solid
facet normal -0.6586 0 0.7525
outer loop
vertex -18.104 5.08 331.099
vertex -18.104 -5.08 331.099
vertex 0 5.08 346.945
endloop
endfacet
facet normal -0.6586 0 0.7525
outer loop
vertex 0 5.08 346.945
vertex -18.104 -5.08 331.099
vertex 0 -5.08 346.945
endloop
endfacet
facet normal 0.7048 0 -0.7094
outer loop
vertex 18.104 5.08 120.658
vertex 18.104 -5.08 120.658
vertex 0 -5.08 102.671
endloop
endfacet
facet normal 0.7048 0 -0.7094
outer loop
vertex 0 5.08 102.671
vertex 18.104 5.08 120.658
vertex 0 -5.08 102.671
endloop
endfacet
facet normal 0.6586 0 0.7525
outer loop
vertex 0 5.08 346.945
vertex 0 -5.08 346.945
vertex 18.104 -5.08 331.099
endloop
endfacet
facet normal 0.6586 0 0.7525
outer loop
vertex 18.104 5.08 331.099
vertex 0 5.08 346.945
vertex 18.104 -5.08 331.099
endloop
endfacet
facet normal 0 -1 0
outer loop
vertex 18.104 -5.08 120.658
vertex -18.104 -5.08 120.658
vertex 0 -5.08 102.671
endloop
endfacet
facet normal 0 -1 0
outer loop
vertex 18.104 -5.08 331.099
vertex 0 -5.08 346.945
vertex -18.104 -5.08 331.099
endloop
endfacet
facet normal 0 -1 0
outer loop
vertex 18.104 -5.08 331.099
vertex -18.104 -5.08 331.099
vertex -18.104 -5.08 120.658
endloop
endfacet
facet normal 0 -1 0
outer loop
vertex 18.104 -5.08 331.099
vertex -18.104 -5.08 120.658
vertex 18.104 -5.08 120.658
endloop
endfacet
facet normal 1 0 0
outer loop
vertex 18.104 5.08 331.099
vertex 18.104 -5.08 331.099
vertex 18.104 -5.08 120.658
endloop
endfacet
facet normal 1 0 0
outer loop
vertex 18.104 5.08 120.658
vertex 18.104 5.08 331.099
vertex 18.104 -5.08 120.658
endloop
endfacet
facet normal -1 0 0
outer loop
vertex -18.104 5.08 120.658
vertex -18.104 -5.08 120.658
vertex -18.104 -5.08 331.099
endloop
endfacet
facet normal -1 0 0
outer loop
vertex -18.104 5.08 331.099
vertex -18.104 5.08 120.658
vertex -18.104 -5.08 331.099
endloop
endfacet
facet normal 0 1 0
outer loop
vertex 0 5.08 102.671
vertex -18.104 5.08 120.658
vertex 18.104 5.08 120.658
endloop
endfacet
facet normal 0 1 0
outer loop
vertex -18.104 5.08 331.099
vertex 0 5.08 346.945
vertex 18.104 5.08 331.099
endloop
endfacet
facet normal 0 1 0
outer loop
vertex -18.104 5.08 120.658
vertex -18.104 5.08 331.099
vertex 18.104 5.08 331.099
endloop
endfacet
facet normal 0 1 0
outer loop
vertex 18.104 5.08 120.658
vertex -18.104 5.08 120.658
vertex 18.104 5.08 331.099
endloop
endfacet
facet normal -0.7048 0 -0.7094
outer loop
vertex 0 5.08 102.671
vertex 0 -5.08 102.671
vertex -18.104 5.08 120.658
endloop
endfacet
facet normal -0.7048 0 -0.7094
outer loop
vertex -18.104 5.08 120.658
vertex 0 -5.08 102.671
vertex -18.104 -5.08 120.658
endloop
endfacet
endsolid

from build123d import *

# Parameters (mm, degrees)
F1_DEPTH = 5.08
F2_SIZE2 = 2.54
F2_SIZE  = 2.54
F3_W     = 296.9444543123
F3_H     = 473.9504568279
F4_DEPTH = 25.4
F5_DEPTH = 25.4


with BuildPart() as f1:
    # F0 (on Front) → F1 (new body, symmetric)
    with BuildSketch(Plane.XZ):
        with BuildLine():
            Line((-52.1713197231, 34.4429798424), (-58.770544827, 10.8928056434))
            add(Edge.make_bspline(
                [(-58.770544827, 10.8928056434), (-56.5008980701, 12.7169401311), (-52.1836149963, 16.1867774191), (-46.6481737875, 20.7689821181), (-42.103581434, 21.9474441882), (-37.1718262664, 20.3492743447), (-34.4780249811, 18.782172039), (-33.1500247121, 18.009616062)],
                knots=[0, 0, 0, 0, 0.243402605, 0.4629962541, 0.6364782013, 0.8207896592, 1, 1, 1, 1], degree=3))
            Line((-33.1500247121, 18.009616062), (0, 0))
            Line((0, 0), (33.1500247121, 18.009616062))
            add(Edge.make_bspline(
                [(58.770544827, 10.8928056434), (56.5008980701, 12.7169401311), (52.1836149963, 16.1867774191), (46.6481737875, 20.7689821181), (42.103581434, 21.9474441882), (37.1718262664, 20.3492743447), (34.4780249811, 18.782172039), (33.1500247121, 18.009616062)],
                knots=[0, 0, 0, 0, 0.243402605, 0.4629962541, 0.6364782013, 0.8207896592, 1, 1, 1, 1], degree=3))
            Line((58.770544827, 10.8928056434), (52.1713197231, 34.4429798424))
            add(Edge.make_bspline(
                [(52.1713197231, 34.4429798424), (50.9728401731, 36.5972375719), (48.6948112169, 40.6919770164), (44.4995729387, 45.251524036), (40.7511119594, 46.0496576718), (38.4311188014, 45.2100224851), (37.2595414519, 44.7860136628)],
                knots=[0, 0, 0, 0, 0.3036076859, 0.5770871099, 0.7864324897, 1, 1, 1, 1], degree=3))
            Line((37.2595414519, 44.7860136628), (12.3838605359, 31.5890572965))
            add(Edge.make_bspline(
                [(12.3838605359, 31.5890572965), (12.0116389407, 36.4336241706), (11.2801299785, 45.9544153649), (11.9072727509, 59.0755429111), (13.0446244948, 72.3270750889), (15.0430309606, 81.3553880474), (20.0484846376, 98.9141245501), (23.1138356658, 110.0238526226), (25.6900193935, 114.2539658888), (26.796290651, 116.070471704)],
                knots=[0, 0, 0, 0, 0.1554376564, 0.3054740514, 0.451951706, 0.5786332255, 0.7535204728, 0.8941561452, 1, 1, 1, 1], degree=3))
            add(Edge.make_bspline(
                [(26.796290651, 116.070471704), (27.3208616845, 122.376340647), (28.4465148418, 135.9078184294), (30.7430371303, 162.2435359747), (32.8128164069, 193.0751698329), (36.1980689164, 226.214181027), (36.6885878869, 228.6104286649), (36.1789175706, 231.6056884809), (34.578084839, 241.1608396791), (32.1815946616, 268.5632469899), (29.2022062034, 298.3654205907), (26.6745591694, 323.5321383941), (26.2740528758, 332.6532529053), (26.1084791273, 336.424022913)],
                knots=[0, 0, 0, 0, 0.0954552012, 0.2048329812, 0.3319664827, 0.4522041038, 0.4827906265, 0.5164846256, 0.5812786199, 0.6946646008, 0.8165569483, 0.9241626057, 1, 1, 1, 1], degree=3))
            Line((26.1084791273, 336.424022913), (0, 384.5021128654))
            Line((0, 384.5021128654), (-26.1084791273, 336.424022913))
            add(Edge.make_bspline(
                [(-26.796290651, 116.070471704), (-27.3208616845, 122.376340647), (-28.4465148418, 135.9078184294), (-30.7430371303, 162.2435359747), (-32.8128164069, 193.0751698329), (-36.1980689164, 226.214181027), (-36.6885878869, 228.6104286649), (-36.1789175706, 231.6056884809), (-34.578084839, 241.1608396791), (-32.1815946616, 268.5632469899), (-29.2022062034, 298.3654205907), (-26.6745591694, 323.5321383941), (-26.2740528758, 332.6532529053), (-26.1084791273, 336.424022913)],
                knots=[0, 0, 0, 0, 0.0954552012, 0.2048329812, 0.3319664827, 0.4522041038, 0.4827906265, 0.5164846256, 0.5812786199, 0.6946646008, 0.8165569483, 0.9241626057, 1, 1, 1, 1], degree=3))
            add(Edge.make_bspline(
                [(-12.3838605359, 31.5890572965), (-12.0116389407, 36.4336241706), (-11.2801299785, 45.9544153649), (-11.9072727509, 59.0755429111), (-13.0446244948, 72.3270750889), (-15.0430309606, 81.3553880474), (-20.0484846376, 98.9141245501), (-23.1138356658, 110.0238526226), (-25.6900193935, 114.2539658888), (-26.796290651, 116.070471704)],
                knots=[0, 0, 0, 0, 0.1554376564, 0.3054740514, 0.451951706, 0.5786332255, 0.7535204728, 0.8941561452, 1, 1, 1, 1], degree=3))
            Line((-12.3838605359, 31.5890572965), (-37.2595414519, 44.7860136628))
            add(Edge.make_bspline(
                [(-52.1713197231, 34.4429798424), (-50.9728401731, 36.5972375719), (-48.6948112169, 40.6919770164), (-44.4995729387, 45.251524036), (-40.7511119594, 46.0496576718), (-38.4311188014, 45.2100224851), (-37.2595414519, 44.7860136628)],
                knots=[0, 0, 0, 0, 0.3036076859, 0.5770871099, 0.7864324897, 1, 1, 1, 1], degree=3))
        make_face()
    extrude(amount=F1_DEPTH, both=True)

    # F2
    f2_edges = [f1.edges().sort_by_distance(p)[0] for p in [
        (-36.32486, 5.08, 226.315561),
        (-13.693841, 5.08, 74.863456),
        (-24.821701, 5.08, 38.187535),
        (-46.502615, 5.08, 42.946726),
        (-55.470932, 5.08, 22.667893),
        (-47.034517, 5.08, 20.082213),
        (-16.575012, 5.08, 9.004808),
        (16.575012, 5.08, 9.004808),
        (47.034517, 5.08, 20.082213),
        (55.470932, 5.08, 22.667893),
        (46.502615, 5.08, 42.946726),
        (24.821701, 5.08, 38.187535),
        (13.693841, 5.08, 74.863456),
        (36.32486, 5.08, 226.315561),
        (13.05424, 5.08, 360.463068),
        (-13.05424, 5.08, 360.463068),
        (-36.32486, -5.08, 226.315561),
        (-13.693841, -5.08, 74.863456),
        (-24.821701, -5.08, 38.187535),
        (-46.502615, -5.08, 42.946726),
        (-55.470932, -5.08, 22.667893),
        (-47.034517, -5.08, 20.082213),
        (-16.575012, -5.08, 9.004808),
        (16.575012, -5.08, 9.004808),
        (47.034517, -5.08, 20.082213),
        (55.470932, -5.08, 22.667893),
        (46.502615, -5.08, 42.946726),
        (24.821701, -5.08, 38.187535),
        (13.693841, -5.08, 74.863456),
        (36.32486, -5.08, 226.315561),
        (13.05424, -5.08, 360.463068),
        (-13.05424, -5.08, 360.463068),
    ]]
    chamfer(f2_edges, length=F2_SIZE, length2=F2_SIZE2)

    # F3 (on Front) → F4 (cut)
    with BuildSketch(Plane.XZ):
        with Locations((-3.1622722745, 199.3846241385)):
            Rectangle(F3_W, F3_H)
        Polygon((18.1035045534, 120.6582784653), (0, 102.6714965701), (-18.1035045534, 120.6582784653), (-18.1035045534, 331.0994207859), (0, 346.9451367855), (18.1035045534, 331.0994207859), align=None, mode=Mode.SUBTRACT)
    extrude(amount=-F4_DEPTH, mode=Mode.SUBTRACT)

    # F5 (cut): a face of the model
    f5_faces = [f1.faces().sort_by_distance(p)[0] for p in [
        (-9.5209365747, 0, 358.5443317782),
    ]]
    extrude(f5_faces, amount=-F5_DEPTH, mode=Mode.SUBTRACT)


solid = f1.part
